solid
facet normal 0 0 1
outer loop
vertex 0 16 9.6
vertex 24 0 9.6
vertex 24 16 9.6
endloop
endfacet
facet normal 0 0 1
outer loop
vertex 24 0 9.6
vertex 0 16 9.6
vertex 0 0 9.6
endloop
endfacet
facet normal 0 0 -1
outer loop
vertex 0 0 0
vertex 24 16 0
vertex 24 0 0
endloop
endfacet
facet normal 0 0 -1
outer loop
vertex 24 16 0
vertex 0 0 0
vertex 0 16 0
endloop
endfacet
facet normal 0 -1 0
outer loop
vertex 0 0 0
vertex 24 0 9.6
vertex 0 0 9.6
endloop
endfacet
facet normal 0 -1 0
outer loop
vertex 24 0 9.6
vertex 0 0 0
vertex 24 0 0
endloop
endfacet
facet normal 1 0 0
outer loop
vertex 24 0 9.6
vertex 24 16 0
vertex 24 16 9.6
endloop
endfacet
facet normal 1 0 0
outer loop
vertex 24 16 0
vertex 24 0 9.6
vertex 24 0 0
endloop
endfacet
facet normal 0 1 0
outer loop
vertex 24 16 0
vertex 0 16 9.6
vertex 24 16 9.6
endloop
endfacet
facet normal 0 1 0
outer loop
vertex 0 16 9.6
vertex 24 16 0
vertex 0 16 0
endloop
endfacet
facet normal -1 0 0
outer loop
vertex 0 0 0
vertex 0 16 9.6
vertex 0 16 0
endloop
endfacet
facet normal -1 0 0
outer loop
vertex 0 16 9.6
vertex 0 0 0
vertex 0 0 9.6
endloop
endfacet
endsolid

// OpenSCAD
LEGObrick();

module LEGObrick(studs_per_row=3) {
    cube([24, 16, 9.6]);
}
